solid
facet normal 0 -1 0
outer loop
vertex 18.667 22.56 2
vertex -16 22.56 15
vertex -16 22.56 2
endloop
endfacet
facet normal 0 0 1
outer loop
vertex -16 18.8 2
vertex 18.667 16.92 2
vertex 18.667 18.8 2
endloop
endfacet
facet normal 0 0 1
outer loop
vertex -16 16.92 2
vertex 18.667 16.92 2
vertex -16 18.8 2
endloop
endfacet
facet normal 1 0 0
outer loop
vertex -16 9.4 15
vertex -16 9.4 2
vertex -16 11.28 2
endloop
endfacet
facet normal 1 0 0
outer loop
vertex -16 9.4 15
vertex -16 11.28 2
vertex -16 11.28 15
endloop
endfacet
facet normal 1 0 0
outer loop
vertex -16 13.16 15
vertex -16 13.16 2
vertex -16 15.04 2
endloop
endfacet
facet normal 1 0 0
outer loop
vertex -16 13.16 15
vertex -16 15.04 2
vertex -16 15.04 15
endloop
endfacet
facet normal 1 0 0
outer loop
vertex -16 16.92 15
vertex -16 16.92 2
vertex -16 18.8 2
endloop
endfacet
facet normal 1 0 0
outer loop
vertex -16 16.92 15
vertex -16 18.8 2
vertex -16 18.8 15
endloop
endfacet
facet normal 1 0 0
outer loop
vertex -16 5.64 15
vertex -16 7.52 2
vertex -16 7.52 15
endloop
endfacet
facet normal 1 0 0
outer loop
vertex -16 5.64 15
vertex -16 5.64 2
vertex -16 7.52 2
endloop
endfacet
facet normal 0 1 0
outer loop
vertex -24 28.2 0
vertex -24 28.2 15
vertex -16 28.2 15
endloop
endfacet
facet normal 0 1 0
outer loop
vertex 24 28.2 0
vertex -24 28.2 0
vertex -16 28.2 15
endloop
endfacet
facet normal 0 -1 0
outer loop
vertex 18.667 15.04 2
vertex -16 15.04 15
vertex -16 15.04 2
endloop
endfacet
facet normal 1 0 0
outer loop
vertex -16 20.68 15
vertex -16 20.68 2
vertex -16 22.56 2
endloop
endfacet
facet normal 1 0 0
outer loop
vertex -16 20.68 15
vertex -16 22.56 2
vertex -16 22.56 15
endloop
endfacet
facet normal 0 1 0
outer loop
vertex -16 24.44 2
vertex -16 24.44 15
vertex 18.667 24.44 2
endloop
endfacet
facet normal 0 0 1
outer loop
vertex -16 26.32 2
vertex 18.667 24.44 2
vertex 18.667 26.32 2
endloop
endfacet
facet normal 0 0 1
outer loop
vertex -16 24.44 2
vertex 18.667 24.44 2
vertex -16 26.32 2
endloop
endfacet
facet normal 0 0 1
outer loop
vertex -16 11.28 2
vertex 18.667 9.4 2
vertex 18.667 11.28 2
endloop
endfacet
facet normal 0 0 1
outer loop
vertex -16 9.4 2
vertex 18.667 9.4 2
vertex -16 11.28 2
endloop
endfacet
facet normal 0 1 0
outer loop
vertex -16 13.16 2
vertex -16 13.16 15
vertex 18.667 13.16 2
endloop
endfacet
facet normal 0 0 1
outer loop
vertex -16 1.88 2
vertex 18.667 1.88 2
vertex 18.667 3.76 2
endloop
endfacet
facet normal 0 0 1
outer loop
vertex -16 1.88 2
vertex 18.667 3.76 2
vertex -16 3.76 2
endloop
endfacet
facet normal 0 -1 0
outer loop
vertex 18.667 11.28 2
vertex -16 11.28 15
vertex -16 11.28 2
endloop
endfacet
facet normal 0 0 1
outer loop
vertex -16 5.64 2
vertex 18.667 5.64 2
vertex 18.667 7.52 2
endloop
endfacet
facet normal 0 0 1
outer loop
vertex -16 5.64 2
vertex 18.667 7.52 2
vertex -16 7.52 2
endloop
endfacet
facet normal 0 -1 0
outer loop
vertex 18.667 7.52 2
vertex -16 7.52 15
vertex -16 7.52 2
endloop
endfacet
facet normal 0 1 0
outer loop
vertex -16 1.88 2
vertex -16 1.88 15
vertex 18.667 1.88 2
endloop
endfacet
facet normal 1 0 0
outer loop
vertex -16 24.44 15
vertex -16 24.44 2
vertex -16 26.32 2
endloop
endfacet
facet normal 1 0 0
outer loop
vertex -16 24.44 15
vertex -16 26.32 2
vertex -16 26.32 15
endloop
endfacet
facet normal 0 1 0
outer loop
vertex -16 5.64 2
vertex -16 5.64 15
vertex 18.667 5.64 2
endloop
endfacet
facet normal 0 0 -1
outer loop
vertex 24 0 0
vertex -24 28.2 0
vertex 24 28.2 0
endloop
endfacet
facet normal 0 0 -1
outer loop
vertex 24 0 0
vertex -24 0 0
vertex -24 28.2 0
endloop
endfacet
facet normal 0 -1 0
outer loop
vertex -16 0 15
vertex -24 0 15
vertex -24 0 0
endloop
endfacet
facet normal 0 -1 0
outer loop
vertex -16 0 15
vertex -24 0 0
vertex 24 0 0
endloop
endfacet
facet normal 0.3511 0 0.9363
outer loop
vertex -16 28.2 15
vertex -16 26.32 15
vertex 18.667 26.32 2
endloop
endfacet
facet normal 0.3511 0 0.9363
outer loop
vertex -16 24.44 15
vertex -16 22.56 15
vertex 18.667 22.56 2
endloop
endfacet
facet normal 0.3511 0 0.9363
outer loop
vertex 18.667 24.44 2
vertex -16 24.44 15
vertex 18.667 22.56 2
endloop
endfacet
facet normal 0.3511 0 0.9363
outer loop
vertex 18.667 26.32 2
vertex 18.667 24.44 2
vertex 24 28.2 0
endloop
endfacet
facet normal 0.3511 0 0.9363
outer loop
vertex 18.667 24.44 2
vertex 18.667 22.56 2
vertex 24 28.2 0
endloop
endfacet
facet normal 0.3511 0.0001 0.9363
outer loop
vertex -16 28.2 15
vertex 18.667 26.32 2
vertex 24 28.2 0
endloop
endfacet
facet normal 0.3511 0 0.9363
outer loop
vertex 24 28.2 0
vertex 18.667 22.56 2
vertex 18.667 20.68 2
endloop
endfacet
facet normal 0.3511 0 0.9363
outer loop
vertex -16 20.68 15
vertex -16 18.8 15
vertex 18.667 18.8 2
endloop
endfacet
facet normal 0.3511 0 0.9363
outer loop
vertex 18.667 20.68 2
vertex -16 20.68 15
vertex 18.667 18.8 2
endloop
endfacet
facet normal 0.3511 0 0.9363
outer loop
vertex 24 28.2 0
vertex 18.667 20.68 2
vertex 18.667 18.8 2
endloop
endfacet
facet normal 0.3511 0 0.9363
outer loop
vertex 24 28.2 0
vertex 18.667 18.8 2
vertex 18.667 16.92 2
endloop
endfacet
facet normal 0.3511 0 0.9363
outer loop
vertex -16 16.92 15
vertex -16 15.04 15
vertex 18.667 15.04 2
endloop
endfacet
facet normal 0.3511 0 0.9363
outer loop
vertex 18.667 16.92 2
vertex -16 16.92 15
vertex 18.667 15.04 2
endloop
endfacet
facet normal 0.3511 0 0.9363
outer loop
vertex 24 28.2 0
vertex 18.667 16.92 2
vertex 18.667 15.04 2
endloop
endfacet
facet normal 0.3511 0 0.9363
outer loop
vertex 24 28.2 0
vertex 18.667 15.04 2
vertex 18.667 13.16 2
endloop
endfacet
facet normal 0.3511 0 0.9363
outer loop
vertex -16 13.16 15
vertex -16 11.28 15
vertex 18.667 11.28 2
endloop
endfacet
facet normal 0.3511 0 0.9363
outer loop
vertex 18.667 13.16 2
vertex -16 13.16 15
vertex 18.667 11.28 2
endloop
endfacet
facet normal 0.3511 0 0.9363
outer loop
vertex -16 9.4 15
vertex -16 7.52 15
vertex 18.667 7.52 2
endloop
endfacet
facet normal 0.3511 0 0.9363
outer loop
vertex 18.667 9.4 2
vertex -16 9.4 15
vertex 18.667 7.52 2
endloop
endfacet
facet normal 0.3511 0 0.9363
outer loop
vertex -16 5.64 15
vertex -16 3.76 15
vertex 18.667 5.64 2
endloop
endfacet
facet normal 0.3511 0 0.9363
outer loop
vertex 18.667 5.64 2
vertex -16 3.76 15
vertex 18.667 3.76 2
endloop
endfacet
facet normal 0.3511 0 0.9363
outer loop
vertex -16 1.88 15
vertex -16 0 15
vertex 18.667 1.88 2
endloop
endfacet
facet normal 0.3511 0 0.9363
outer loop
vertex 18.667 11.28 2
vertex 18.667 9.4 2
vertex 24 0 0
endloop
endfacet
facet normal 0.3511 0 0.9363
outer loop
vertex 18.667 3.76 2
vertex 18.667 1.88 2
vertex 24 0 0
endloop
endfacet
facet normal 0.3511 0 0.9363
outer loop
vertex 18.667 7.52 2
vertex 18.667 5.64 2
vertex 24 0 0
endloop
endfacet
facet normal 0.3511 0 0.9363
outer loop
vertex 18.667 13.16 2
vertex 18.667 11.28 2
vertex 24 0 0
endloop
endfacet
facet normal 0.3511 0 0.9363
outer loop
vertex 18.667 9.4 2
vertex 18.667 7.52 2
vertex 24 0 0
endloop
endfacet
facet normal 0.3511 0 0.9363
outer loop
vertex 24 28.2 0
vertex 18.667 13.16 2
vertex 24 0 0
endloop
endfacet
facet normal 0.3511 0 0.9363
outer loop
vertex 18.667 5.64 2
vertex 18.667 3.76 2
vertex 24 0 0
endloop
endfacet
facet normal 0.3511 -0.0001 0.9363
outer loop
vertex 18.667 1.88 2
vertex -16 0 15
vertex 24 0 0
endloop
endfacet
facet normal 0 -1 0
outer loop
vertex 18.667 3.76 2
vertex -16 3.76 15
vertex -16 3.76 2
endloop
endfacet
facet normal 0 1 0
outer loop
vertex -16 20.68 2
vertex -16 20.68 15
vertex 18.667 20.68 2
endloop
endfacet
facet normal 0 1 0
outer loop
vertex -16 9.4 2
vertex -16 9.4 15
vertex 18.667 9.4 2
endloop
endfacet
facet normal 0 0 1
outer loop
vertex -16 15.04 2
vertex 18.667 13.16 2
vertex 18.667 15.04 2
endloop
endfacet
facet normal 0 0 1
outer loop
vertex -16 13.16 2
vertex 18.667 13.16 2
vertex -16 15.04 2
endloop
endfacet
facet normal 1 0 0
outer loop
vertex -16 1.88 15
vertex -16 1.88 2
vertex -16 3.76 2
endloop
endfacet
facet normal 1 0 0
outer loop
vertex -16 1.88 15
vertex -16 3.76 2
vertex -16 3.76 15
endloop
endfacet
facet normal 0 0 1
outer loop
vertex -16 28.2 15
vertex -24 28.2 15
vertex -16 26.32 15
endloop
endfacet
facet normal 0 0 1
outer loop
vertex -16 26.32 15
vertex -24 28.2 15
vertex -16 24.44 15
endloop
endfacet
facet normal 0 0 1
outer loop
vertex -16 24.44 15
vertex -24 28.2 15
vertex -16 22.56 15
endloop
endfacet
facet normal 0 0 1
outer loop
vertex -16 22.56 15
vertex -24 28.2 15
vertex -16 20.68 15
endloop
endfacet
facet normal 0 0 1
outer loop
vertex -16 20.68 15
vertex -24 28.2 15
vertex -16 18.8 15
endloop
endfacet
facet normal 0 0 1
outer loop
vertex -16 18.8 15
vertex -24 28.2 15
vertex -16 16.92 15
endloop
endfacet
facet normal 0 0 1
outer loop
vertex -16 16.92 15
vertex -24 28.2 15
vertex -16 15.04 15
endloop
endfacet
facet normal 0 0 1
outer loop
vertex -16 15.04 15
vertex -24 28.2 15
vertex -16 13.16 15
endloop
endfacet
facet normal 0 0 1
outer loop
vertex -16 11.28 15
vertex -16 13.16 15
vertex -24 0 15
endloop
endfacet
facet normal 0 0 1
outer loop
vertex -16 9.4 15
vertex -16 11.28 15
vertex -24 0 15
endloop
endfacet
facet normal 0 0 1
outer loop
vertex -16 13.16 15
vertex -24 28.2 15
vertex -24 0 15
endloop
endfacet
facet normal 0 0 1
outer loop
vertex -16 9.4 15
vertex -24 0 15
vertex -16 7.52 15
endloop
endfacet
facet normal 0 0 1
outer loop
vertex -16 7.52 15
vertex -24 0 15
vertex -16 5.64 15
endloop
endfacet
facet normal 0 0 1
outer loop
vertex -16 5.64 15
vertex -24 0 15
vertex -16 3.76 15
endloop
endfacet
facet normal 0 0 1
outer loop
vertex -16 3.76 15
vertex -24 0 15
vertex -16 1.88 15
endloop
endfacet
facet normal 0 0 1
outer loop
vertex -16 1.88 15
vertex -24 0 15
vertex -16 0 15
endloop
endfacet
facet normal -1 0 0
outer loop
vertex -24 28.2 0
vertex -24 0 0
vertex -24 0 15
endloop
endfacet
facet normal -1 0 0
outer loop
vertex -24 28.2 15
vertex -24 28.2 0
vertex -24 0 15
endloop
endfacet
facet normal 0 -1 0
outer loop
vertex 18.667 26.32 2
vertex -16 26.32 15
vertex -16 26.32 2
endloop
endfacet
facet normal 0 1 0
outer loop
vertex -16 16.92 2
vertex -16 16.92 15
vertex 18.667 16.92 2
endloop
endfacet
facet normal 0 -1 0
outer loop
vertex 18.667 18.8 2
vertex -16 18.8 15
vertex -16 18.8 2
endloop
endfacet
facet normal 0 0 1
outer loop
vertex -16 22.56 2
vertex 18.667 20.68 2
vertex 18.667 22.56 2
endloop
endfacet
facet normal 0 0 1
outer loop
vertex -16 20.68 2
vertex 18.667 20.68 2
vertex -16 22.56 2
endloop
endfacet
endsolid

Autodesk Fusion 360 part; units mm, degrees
sketch "Sketch1" plane through (0, 0, 0) normal (0, 1, 0) x (1, 0, 0)
  line L0 (-24, 0) -> (24, 0)
  line L1 (1.75, 0) -> (22.5, 0)
  line L2 (0, -1.75) -> (0, -22.5)
  line L3 (-24, 0) -> (-24, -15)
  line L4 (-24, -15) -> (-16, -15)
  line L5 (-16, -15) -> (24, 0)
  dimension "d1" = 48
  dimension "d2" = 15
  dimension "d3" = 8
extrude "Extrude1" add sketch "Sketch1" along normal blind 28.2
ref_plane "WorkPlane1" through (0, 1.88, 7.5) normal (0, -1, 0) x (-1, 0, 0)
sketch "Sketch2" plane through (0, 1.88, 7.5) normal (0, -1, 0) x (1, 0, 0)
  line L0 (-16, 7.5) -> (24, -7.5)
  line L1 (24, -7.5) -> (-24, -7.5)
  line L2 (18.6667, -5.5) -> (-16, -5.5)
  line L3 (-16, -5.5) -> (-16, 7.5)
  line L4 (18.6667, 7.5) -> (-16, 7.5)
  line L5 (18.6667, -5.5) -> (18.6667, 7.5)
  dimension "d7" = 2
extrude "Extrude2" cut sketch "Sketch2" against normal blind 1.88
pattern_linear "R-Pattern1" count 7 spacing 3.76 along (0, 1, 0) of "Extrude2"
equation "d4 = ( ( 1.88 * 2 ) * 1 mm ) * 7 + 1.88 mm"
equation "d12 = -1.88 * 2 mm"
